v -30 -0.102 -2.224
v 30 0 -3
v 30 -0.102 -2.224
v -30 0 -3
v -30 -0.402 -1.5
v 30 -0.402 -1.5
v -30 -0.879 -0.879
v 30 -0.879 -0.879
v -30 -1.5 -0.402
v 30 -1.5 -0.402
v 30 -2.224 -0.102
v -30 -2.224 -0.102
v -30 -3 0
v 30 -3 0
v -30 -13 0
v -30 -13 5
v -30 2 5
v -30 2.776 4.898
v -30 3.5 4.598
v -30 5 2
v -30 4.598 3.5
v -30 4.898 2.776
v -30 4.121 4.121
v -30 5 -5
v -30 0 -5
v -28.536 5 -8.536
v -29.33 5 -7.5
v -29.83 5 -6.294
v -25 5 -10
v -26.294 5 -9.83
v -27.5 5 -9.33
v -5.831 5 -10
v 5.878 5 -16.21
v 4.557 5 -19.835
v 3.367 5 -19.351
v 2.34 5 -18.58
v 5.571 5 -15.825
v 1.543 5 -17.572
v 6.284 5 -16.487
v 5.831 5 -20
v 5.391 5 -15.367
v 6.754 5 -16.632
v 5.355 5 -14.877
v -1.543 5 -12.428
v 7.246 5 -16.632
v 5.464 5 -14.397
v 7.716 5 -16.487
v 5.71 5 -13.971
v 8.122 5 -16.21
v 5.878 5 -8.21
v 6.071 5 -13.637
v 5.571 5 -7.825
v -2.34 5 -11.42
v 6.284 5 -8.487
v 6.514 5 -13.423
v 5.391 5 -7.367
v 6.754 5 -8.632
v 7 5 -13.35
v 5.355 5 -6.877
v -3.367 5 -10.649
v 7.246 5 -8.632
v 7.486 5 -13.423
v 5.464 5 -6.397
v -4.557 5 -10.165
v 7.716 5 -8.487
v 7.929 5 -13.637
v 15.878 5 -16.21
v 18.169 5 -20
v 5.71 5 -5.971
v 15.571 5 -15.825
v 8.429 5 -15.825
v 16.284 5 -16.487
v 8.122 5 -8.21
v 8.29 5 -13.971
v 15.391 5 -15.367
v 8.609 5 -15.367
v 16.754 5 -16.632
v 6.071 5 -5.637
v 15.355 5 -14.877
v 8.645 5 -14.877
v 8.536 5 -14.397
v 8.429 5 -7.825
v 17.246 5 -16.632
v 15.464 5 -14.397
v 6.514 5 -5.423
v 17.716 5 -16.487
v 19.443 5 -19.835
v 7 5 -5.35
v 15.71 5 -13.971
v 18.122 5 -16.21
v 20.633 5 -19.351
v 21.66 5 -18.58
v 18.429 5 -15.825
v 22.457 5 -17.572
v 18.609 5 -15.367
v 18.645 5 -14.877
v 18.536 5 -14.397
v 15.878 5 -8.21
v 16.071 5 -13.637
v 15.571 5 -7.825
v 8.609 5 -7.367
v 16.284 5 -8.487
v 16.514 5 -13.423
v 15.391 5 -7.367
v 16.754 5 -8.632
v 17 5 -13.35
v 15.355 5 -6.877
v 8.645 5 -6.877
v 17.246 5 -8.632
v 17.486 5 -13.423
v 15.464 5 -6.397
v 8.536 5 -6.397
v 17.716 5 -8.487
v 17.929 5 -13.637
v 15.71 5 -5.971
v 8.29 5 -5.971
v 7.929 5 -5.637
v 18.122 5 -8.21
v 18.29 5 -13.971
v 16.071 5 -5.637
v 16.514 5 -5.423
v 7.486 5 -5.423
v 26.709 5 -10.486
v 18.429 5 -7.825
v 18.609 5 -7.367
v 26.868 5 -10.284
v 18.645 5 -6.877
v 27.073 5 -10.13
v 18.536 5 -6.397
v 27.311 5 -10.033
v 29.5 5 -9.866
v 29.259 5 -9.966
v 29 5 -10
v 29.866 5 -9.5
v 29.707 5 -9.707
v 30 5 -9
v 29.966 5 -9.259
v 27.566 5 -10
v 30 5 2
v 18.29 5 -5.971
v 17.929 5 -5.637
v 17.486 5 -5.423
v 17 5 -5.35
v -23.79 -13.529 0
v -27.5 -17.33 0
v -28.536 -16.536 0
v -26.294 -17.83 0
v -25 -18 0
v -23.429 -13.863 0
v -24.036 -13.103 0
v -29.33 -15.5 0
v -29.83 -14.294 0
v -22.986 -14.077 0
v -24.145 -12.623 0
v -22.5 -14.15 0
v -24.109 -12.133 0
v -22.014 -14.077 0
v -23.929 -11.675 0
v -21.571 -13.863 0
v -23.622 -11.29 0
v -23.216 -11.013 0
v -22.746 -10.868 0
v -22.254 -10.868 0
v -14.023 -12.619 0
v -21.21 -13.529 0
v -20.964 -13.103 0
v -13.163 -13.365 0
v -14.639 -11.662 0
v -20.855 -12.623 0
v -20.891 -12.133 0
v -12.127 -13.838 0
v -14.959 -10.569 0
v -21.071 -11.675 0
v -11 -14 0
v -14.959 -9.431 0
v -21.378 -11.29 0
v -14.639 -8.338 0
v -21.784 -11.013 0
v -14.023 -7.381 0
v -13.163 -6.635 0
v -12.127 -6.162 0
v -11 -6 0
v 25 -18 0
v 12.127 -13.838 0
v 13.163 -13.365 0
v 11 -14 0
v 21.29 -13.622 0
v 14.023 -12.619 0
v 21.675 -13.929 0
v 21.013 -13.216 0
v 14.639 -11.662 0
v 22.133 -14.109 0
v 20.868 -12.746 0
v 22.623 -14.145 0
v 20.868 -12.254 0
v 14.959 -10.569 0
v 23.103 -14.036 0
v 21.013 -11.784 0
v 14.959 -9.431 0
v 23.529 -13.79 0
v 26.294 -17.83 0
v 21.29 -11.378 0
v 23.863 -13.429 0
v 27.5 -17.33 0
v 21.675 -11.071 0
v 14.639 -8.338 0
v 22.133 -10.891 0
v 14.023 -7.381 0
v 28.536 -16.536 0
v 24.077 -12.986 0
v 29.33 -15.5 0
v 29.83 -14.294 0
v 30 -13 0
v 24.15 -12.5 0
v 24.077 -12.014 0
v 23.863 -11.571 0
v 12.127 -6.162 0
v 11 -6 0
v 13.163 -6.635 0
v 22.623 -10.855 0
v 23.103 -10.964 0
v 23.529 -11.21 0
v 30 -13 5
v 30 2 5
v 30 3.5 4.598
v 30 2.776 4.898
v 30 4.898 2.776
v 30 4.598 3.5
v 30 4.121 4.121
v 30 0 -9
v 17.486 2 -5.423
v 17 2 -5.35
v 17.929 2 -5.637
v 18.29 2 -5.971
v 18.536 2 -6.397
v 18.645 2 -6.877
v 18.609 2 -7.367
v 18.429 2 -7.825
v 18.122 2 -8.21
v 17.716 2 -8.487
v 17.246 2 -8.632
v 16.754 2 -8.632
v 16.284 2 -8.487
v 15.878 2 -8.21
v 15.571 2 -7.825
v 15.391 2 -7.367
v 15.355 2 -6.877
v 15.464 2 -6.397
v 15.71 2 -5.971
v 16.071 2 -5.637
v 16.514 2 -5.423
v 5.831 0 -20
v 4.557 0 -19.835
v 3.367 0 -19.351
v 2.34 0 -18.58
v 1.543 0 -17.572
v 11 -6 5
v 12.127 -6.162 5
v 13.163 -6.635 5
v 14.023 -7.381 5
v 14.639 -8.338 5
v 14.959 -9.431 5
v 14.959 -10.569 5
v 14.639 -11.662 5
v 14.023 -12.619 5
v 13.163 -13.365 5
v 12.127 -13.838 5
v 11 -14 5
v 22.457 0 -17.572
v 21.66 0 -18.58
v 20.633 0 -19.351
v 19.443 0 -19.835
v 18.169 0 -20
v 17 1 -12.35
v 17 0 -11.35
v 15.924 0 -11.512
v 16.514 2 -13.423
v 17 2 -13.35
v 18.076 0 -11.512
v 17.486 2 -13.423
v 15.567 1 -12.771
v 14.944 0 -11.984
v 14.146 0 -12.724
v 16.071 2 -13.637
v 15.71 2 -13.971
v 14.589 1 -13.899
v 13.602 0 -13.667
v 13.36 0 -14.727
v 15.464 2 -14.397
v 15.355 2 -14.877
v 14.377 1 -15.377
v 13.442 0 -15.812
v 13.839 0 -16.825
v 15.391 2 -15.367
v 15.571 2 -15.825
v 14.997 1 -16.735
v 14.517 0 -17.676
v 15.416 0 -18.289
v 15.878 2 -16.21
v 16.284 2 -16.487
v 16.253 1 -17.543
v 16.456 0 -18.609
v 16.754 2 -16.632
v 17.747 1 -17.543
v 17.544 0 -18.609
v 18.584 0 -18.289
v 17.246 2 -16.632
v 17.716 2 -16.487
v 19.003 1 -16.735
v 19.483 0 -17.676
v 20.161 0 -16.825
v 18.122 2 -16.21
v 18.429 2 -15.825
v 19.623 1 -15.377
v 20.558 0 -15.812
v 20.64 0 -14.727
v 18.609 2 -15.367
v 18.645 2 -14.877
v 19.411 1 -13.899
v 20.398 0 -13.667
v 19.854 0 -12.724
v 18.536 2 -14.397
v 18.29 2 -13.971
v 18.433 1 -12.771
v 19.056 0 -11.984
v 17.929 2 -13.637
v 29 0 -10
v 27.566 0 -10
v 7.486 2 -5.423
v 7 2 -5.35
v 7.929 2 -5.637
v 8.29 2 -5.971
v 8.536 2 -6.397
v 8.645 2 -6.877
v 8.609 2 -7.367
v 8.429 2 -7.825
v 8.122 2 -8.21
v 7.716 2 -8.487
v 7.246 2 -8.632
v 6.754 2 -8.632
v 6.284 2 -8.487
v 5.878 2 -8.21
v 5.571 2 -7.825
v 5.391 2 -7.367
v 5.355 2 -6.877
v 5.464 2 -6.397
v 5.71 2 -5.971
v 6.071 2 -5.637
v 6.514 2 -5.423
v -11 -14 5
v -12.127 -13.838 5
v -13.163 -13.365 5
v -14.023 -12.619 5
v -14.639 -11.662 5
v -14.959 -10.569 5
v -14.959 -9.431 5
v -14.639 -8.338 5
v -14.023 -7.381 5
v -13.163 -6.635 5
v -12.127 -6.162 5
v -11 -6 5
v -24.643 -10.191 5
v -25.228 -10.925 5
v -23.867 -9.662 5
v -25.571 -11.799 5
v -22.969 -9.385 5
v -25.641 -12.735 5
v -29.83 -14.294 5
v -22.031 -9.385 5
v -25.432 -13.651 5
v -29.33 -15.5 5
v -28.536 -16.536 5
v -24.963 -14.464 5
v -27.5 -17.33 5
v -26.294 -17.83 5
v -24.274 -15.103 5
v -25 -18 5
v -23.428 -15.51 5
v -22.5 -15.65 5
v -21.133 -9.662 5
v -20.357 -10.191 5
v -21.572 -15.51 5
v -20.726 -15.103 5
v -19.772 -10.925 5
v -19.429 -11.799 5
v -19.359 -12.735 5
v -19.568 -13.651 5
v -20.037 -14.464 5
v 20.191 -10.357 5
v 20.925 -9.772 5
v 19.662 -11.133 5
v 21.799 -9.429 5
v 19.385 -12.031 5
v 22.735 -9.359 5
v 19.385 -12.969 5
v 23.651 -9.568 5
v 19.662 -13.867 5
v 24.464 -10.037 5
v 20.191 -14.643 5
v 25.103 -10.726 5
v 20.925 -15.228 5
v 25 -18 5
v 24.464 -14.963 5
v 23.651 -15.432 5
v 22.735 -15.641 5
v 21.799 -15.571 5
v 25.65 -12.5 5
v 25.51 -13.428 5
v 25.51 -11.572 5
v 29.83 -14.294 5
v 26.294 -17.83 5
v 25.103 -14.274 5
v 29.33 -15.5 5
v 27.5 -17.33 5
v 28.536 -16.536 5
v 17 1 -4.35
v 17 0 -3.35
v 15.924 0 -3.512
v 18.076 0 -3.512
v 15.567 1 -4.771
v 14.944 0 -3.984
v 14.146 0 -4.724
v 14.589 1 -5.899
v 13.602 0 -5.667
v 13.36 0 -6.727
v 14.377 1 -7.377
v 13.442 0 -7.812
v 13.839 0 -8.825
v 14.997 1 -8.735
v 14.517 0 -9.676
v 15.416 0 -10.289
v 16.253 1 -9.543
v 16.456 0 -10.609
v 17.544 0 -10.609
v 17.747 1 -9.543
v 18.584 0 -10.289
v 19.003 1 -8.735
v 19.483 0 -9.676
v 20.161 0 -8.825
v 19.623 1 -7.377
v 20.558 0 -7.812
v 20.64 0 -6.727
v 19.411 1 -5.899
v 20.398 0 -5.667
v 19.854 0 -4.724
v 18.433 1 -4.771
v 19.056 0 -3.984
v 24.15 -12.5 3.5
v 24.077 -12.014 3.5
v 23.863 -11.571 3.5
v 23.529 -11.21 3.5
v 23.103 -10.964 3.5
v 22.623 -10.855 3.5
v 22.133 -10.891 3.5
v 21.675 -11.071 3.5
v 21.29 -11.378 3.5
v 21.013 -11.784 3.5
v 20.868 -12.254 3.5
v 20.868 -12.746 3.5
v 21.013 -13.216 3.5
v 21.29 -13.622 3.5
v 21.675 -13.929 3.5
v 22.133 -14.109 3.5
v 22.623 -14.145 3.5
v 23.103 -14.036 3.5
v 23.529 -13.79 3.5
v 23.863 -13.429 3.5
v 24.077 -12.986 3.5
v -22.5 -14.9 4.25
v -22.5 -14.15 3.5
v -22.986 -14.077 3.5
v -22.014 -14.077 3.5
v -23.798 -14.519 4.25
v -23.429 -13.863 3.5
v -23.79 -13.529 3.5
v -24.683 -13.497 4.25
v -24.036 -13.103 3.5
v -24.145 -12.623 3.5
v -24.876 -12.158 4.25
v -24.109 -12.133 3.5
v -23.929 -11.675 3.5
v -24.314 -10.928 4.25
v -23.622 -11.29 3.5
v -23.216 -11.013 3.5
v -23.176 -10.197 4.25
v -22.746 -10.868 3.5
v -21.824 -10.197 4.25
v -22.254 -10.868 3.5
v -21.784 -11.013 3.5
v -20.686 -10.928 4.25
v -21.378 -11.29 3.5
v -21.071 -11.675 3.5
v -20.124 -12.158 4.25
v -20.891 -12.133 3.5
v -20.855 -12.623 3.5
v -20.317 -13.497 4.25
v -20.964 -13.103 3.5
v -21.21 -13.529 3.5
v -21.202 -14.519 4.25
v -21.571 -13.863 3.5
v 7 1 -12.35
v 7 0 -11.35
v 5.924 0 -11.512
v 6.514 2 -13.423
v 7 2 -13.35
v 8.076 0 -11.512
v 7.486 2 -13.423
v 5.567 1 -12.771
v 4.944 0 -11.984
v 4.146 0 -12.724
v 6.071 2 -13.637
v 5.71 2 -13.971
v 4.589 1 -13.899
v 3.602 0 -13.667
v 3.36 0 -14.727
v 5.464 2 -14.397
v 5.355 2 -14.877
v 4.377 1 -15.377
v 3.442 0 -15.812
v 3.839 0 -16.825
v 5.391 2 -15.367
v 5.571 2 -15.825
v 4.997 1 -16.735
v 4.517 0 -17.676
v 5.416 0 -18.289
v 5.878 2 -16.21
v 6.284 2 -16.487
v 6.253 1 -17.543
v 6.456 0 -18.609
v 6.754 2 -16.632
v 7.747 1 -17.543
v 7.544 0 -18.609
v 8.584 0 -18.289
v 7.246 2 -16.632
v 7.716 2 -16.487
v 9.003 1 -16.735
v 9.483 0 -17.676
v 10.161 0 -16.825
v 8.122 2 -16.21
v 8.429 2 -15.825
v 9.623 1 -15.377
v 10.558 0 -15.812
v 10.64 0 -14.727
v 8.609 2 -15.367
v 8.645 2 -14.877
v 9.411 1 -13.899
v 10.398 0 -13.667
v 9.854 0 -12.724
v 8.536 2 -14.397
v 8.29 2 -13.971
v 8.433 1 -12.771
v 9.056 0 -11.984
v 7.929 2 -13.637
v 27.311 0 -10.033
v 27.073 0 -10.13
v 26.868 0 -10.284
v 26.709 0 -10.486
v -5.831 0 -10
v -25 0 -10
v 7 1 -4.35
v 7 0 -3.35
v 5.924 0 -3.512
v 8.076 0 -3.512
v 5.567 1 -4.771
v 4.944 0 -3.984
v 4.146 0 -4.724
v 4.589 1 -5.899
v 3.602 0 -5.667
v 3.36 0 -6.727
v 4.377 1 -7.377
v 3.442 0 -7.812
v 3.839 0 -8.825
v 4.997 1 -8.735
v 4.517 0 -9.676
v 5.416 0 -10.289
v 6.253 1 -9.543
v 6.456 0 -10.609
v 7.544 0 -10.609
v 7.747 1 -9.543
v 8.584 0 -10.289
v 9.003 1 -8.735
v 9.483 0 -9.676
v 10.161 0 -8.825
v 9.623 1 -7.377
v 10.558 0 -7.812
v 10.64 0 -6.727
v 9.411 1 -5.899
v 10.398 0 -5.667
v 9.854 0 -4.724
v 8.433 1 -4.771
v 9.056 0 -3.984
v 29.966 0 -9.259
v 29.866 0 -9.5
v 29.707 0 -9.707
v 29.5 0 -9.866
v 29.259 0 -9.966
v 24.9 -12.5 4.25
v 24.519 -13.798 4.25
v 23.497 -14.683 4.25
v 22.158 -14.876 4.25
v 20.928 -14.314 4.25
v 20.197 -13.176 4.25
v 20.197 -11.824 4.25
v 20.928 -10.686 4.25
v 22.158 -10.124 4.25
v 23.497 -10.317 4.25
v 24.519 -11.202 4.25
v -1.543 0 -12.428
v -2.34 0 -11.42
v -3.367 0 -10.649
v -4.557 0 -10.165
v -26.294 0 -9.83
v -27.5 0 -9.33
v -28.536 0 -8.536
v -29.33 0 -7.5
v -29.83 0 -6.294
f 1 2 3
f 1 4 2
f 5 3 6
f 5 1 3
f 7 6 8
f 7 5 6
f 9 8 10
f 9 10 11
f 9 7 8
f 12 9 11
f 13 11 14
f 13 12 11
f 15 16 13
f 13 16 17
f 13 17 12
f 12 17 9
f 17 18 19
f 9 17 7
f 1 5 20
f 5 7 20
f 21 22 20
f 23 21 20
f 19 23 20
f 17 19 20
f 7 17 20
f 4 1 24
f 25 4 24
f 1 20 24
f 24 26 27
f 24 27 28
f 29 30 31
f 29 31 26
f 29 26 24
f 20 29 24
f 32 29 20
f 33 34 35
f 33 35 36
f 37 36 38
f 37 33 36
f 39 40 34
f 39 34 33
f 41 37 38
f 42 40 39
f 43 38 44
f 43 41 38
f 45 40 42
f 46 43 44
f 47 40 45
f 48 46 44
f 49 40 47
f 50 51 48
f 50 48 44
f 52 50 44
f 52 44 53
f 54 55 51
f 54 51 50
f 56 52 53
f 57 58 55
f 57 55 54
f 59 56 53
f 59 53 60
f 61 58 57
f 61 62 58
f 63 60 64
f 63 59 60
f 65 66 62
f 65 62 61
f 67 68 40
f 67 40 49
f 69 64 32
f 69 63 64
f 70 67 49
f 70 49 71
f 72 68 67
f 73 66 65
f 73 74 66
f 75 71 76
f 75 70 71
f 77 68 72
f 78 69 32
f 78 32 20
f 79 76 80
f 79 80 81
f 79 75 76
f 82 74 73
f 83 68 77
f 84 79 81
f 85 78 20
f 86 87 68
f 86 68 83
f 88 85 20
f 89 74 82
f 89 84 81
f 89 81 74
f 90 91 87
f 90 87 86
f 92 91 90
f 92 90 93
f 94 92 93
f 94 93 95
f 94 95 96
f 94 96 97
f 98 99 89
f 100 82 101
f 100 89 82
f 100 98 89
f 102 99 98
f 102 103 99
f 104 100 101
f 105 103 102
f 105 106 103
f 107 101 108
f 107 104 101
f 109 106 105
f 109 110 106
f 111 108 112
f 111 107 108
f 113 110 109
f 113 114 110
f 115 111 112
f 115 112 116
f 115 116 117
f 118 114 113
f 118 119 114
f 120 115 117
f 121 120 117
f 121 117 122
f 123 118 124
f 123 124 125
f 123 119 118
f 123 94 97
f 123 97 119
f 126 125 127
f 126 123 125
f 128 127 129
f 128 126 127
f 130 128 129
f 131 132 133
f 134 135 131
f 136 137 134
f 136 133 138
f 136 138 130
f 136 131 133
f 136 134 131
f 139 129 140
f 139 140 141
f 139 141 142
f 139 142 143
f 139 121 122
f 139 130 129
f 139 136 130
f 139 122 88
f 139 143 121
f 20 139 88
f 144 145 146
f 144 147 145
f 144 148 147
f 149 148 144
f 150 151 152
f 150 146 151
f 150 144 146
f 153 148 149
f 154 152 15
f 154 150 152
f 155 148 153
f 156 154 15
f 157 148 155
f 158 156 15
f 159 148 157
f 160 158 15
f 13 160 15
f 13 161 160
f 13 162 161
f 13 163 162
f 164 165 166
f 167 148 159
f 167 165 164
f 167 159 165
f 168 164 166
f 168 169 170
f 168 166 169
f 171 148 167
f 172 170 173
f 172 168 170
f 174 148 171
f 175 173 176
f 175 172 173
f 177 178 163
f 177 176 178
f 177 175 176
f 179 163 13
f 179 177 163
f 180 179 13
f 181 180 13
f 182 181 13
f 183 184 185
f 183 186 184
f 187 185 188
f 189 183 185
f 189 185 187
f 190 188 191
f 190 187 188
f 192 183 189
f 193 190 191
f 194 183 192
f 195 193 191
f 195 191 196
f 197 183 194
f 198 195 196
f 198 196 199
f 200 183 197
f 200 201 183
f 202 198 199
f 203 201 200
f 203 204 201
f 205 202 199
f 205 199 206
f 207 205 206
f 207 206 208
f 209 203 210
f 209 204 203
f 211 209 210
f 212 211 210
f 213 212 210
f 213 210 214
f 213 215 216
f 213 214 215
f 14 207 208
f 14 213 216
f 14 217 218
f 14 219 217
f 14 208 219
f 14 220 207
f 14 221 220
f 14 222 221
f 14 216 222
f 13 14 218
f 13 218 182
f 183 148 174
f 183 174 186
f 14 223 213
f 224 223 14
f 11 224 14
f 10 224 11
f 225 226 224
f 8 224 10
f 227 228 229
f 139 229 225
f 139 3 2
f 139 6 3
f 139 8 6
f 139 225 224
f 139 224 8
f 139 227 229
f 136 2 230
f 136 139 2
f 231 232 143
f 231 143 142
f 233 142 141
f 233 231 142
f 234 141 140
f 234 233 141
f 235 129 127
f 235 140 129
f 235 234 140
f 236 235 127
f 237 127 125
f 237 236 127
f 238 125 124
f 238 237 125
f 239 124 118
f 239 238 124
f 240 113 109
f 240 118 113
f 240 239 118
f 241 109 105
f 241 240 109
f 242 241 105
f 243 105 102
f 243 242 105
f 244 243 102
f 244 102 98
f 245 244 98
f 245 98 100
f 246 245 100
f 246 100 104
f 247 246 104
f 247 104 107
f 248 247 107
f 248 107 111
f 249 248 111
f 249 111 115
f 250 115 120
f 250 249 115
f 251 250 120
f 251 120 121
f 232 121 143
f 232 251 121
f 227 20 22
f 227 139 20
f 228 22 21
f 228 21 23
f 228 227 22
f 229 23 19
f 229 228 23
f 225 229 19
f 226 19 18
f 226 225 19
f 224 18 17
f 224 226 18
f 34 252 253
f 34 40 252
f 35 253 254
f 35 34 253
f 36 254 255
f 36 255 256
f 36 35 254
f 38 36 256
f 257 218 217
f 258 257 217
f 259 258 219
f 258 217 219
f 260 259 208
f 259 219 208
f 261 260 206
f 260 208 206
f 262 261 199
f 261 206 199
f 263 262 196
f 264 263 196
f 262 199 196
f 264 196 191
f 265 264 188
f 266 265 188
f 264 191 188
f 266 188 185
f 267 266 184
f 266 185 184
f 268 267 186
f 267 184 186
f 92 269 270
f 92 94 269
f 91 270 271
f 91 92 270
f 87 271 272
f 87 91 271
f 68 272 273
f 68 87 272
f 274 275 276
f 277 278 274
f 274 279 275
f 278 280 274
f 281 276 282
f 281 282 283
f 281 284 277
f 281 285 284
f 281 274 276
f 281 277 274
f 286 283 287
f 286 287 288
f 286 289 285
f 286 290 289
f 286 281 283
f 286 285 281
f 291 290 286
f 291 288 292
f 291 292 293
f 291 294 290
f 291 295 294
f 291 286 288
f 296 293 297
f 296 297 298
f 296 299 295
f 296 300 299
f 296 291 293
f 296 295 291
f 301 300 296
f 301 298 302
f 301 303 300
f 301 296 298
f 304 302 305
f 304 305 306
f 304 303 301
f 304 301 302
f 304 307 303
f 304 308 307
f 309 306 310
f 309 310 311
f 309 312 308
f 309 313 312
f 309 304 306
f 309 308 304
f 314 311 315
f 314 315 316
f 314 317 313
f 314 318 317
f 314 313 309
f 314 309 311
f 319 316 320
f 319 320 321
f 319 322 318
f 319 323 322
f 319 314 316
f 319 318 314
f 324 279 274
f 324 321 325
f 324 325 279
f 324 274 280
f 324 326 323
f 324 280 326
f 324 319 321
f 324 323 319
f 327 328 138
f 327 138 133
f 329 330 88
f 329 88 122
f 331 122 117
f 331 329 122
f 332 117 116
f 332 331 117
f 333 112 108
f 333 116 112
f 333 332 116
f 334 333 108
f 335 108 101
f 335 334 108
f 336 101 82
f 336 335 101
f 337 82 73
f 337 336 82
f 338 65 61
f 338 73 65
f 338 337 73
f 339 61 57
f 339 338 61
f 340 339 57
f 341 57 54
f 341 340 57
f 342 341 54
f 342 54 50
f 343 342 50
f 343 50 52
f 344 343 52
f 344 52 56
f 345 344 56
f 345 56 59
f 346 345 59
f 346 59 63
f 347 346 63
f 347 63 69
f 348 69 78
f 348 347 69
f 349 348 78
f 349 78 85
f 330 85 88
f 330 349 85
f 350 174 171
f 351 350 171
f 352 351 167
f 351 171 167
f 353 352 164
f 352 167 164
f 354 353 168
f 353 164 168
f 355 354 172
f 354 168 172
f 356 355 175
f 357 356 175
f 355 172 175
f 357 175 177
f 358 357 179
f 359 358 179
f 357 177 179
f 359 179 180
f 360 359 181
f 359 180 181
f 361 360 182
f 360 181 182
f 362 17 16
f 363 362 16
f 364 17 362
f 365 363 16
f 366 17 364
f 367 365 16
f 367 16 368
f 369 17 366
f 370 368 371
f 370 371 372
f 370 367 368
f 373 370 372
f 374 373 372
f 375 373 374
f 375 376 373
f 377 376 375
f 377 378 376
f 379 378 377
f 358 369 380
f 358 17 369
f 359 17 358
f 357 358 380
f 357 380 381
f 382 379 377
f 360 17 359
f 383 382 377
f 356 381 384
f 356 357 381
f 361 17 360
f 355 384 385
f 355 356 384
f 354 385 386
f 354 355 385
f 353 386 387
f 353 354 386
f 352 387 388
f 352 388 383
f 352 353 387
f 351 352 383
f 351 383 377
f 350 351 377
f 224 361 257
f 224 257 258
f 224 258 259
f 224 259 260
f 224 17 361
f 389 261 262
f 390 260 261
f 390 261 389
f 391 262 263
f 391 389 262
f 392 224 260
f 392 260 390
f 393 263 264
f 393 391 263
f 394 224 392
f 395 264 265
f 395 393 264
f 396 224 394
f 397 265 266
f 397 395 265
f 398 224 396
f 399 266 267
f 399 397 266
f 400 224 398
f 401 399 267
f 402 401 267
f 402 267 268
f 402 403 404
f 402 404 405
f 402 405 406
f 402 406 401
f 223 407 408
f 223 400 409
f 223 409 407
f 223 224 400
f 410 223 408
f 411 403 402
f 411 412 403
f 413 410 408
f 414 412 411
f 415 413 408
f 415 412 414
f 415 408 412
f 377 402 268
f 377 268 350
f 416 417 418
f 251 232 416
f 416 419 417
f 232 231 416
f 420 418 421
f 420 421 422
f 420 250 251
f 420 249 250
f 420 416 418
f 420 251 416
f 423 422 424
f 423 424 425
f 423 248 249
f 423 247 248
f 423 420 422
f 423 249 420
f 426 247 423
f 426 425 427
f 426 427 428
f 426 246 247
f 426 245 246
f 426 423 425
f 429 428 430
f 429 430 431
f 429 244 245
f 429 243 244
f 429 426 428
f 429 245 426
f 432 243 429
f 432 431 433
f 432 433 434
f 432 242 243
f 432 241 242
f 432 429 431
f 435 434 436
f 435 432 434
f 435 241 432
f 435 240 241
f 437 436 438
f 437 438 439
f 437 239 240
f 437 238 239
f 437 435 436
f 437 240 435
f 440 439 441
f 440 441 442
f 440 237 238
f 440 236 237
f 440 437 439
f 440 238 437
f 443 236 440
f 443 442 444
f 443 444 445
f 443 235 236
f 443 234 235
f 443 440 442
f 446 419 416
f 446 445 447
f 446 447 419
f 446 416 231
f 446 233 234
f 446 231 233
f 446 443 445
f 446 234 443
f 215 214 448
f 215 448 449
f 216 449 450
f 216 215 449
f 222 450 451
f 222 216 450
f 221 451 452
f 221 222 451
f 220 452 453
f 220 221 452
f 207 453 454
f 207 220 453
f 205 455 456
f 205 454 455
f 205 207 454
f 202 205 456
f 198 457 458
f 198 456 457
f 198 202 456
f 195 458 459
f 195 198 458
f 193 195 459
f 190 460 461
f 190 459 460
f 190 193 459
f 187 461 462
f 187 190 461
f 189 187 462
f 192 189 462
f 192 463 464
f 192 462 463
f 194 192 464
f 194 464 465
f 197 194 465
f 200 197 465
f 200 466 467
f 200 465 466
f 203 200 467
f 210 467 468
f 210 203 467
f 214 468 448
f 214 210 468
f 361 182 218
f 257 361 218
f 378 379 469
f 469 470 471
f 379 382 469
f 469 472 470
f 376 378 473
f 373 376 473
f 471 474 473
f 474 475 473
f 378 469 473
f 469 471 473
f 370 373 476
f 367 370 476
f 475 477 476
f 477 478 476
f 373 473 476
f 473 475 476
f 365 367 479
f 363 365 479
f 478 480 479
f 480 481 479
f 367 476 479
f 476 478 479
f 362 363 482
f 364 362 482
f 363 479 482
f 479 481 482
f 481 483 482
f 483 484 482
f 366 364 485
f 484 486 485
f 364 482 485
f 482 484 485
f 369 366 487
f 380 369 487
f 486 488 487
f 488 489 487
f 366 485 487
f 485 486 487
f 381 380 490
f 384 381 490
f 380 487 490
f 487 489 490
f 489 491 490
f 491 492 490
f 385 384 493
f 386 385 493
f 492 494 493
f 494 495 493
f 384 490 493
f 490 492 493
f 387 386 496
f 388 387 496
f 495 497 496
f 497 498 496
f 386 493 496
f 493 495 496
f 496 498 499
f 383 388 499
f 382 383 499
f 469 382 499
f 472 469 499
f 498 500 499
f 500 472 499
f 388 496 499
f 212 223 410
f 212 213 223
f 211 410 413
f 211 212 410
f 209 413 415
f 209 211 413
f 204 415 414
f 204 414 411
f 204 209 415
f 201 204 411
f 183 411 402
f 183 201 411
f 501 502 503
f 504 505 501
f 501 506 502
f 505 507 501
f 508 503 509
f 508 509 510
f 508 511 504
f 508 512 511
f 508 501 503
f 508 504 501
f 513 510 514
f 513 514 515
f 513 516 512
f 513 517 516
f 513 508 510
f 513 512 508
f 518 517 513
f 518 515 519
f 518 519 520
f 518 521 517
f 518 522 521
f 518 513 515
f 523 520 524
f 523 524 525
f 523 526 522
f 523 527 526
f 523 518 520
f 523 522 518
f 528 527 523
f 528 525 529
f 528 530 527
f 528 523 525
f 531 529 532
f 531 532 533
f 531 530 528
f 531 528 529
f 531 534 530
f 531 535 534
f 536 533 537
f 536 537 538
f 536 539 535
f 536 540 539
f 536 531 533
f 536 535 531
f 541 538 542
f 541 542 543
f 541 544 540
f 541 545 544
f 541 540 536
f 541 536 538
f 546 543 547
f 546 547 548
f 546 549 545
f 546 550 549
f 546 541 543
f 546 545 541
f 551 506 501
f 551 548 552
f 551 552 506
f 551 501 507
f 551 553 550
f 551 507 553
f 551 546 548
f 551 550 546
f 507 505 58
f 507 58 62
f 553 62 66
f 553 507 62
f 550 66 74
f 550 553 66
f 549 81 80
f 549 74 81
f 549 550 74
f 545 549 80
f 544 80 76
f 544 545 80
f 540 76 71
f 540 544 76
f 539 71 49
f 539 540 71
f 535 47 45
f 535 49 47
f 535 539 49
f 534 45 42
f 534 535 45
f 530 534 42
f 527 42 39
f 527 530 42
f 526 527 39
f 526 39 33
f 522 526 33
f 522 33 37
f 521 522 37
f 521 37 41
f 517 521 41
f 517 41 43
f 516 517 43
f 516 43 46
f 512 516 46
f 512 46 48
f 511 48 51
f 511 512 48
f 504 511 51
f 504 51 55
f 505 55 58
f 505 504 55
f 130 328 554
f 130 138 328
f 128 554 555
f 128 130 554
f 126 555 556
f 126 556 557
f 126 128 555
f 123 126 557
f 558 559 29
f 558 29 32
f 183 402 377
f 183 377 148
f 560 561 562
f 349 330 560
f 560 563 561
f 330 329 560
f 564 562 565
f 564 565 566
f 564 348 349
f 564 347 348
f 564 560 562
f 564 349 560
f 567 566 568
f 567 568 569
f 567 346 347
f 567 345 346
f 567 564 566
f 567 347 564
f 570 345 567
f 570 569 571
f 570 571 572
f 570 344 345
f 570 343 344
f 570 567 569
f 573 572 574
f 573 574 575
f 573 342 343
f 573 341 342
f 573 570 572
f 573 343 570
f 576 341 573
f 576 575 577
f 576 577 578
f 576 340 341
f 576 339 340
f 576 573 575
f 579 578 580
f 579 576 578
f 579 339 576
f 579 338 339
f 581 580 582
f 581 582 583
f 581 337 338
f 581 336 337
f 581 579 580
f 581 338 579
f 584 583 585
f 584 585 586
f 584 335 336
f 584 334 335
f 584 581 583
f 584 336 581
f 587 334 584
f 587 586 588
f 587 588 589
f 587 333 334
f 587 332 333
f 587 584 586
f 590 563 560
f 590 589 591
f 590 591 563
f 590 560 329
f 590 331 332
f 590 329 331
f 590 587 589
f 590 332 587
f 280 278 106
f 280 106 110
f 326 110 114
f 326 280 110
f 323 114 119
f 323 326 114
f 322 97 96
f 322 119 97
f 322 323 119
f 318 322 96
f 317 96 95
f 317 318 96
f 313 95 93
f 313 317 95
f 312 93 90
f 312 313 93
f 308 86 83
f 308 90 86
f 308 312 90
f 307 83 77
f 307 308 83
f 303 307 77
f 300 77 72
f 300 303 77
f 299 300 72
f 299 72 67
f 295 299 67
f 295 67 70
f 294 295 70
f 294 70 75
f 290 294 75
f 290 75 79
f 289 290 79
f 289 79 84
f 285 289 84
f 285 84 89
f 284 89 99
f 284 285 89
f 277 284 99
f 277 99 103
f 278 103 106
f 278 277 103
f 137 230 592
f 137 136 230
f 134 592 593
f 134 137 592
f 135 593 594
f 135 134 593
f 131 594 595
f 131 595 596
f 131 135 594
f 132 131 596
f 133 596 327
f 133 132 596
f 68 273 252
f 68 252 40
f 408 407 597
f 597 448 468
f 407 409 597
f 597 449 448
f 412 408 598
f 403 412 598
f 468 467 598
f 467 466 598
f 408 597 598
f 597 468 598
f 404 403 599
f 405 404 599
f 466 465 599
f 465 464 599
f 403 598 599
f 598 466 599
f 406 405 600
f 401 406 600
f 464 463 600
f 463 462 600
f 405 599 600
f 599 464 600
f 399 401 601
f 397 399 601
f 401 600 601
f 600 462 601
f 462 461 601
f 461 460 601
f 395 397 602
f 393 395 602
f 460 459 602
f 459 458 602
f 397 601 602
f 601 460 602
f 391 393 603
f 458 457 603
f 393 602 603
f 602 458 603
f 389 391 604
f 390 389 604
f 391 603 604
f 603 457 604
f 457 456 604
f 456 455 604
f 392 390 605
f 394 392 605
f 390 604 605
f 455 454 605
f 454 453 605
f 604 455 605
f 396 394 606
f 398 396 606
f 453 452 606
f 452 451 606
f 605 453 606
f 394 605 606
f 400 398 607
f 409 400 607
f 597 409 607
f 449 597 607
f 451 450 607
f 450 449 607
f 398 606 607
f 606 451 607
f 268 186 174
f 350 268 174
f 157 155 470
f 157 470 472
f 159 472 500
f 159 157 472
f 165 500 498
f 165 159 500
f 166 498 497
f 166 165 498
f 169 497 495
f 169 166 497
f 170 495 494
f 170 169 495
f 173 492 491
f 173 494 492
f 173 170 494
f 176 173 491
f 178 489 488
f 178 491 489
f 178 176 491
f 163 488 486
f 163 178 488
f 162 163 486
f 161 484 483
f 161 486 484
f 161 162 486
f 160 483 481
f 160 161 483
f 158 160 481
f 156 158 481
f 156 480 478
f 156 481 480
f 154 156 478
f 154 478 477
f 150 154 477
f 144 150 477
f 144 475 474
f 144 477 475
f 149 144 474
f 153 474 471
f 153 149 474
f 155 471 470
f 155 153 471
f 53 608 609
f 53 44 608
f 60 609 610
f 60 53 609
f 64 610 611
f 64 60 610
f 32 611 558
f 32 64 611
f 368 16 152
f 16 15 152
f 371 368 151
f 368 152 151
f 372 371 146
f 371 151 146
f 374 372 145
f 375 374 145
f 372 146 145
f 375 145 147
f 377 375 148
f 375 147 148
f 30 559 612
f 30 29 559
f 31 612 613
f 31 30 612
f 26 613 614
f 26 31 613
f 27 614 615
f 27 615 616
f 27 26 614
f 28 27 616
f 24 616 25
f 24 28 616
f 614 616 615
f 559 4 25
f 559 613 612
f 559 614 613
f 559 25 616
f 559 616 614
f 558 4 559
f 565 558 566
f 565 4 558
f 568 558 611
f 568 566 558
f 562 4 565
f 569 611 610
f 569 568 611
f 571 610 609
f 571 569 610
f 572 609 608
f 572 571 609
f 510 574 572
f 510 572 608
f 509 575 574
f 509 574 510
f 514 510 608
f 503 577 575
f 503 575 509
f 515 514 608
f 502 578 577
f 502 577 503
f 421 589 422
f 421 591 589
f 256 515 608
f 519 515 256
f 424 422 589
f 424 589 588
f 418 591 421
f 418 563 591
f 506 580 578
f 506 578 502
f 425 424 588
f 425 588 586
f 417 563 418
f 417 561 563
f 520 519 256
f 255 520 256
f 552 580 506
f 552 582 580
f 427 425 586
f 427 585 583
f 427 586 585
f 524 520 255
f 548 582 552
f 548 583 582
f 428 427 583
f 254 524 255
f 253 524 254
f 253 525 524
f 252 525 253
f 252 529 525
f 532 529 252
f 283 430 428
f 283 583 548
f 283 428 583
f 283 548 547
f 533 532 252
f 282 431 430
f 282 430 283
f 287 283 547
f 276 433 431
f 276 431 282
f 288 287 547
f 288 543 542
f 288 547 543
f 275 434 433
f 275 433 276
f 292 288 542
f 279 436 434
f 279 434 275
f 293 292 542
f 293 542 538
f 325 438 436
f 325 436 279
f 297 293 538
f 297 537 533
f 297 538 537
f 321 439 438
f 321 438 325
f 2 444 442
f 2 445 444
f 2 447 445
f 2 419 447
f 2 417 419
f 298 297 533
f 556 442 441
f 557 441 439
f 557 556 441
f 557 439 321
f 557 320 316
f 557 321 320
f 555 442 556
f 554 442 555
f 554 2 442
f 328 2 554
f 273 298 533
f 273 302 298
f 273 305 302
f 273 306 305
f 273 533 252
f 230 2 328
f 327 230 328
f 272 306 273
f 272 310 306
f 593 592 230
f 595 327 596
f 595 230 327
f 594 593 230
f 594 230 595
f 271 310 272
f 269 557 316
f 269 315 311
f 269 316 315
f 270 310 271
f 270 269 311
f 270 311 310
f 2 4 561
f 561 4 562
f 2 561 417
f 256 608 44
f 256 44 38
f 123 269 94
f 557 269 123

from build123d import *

# Parameters (mm, degrees)
BOSS_EXTRUDE1_DEPTH     = 30
CUT_EXTRUDE1_DEPTH      = 41.298883359
CUT_EXTRUDE1_DEPTH_BACK = 41.298883359
SKETCH2_R               = 1.65
CUT_EXTRUDE2_DEPTH      = 41.298883359
CUT_EXTRUDE2_DEPTH_BACK = 41.298883359
SKETCH3_R               = 1.65
FILLET1_R               = 5
FILLET2_R               = 3
CHAMFER1_SIZE           = 2
CHAMFER2_SIZE           = 1.5
CUT_EXTRUDE3_DEPTH      = 44
CUT_EXTRUDE3_DEPTH_BACK = 44
FILLET3_R               = 1


with BuildPart() as part:
    # Sketch1 → Boss-Extrude1 (new, symmetric)
    with BuildSketch(Plane(origin=(0, 0, 0), x_dir=(0, 0, -1), z_dir=(1, 0, 0))):
        Polygon((0, 0), (20, 0), (20, 5), (-5, 5), (-5, -18), (0, -18), align=None)
    extrude(amount=BOSS_EXTRUDE1_DEPTH, both=True)

    # Sketch2 → Cut-Extrude1 (cut, two sides: drawn at the far end of the back side and taken through both)
    with BuildSketch(Plane.XY.offset(-CUT_EXTRUDE1_DEPTH_BACK)):
        with Locations((22.5, -12.5)):
            Circle(SKETCH2_R)
        with Locations(Location((-22.5, -12.5, 0), (0, 0, 270))):
            Circle(SKETCH2_R)
    extrude(amount=CUT_EXTRUDE1_DEPTH + CUT_EXTRUDE1_DEPTH_BACK, mode=Mode.SUBTRACT)

    # Sketch3 → Cut-Extrude2 (cut, two sides: drawn at the far end of the back side and taken through both)
    with BuildSketch(Plane(origin=(0, 0, 0), x_dir=(1, 0, 0), z_dir=(0, 1, 0)).offset(-CUT_EXTRUDE2_DEPTH_BACK)):
        with Locations(Location((7, 7, 0), (0, 0, 270))):
            Circle(SKETCH3_R)
        with Locations(Location((17, 7, 0), (0, 0, 270))):
            Circle(SKETCH3_R)
        with Locations(Location((17, 15, 0), (0, 0, 270))):
            Circle(SKETCH3_R)
        with Locations(Location((7, 15, 0), (0, 0, 270))):
            Circle(SKETCH3_R)
        Polygon((21, 20), (27, 10), (30, 10), (38.233411058, 24.132528873), (36.351497345, 35.273458054), (14.220192082, 36.929542121), (-3.211887252, 31.82230336), (-34.48112888, 29.547116003), (-37.048006924, 19.046251277), (-30, 10), (-3, 10), (3, 20), align=None)
    extrude(amount=CUT_EXTRUDE2_DEPTH + CUT_EXTRUDE2_DEPTH_BACK, mode=Mode.SUBTRACT)

    # Fillet1
    fillet1_edges = [part.edges().sort_by_distance(p)[0] for p in [
        (30, -18, 2.5),
        (-30, 2.5, -10),
        (21, 2.5, -20),
        (3, 2.5, -20),
        (-3, 2.5, -10),
        (-30, -18, 2.5),
    ]]
    fillet(fillet1_edges, radius=FILLET1_R)

    # Fillet2
    fillet2_edges = [part.edges().sort_by_distance(p)[0] for p in [
        (0, 5, 5),
        (0, 0, 0),
    ]]
    fillet(fillet2_edges, radius=FILLET2_R)

    # Chamfer1
    chamfer1_edges = [part.edges().sort_by_distance(p)[0] for p in [
        (7, 0, -8.65),
        (17, 0, -16.65),
        (7, 0, -16.65),
        (17, 0, -8.65),
    ]]
    chamfer(chamfer1_edges, length=CHAMFER1_SIZE)

    # Chamfer2
    chamfer2_edges = [part.edges().sort_by_distance(p)[0] for p in [
        (20.85, -12.5, 5),
        (-22.5, -10.85, 5),
    ]]
    chamfer(chamfer2_edges, length=CHAMFER2_SIZE)

    # Sketch4 → Cut-Extrude3 (cut, two sides: drawn at the far end of the back side and taken through both)
    with BuildSketch(Plane.XY.offset(5).offset(-CUT_EXTRUDE3_DEPTH_BACK)):
        with BuildLine():
            Line((-11, -6), (11, -6))
            ThreePointArc((11, -6), (15, -10), (11, -14))
            Line((11, -14), (-11, -14))
            ThreePointArc((-11, -14), (-15, -10), (-11, -6))
        make_face()
    extrude(amount=CUT_EXTRUDE3_DEPTH + CUT_EXTRUDE3_DEPTH_BACK, mode=Mode.SUBTRACT)

    # Fillet3
    fillet3_edges = [part.edges().sort_by_distance(p)[0] for p in [
        (30, 2.5, -10),
        (27, 2.5, -10),
    ]]
    fillet(fillet3_edges, radius=FILLET3_R)


solid = part.part
